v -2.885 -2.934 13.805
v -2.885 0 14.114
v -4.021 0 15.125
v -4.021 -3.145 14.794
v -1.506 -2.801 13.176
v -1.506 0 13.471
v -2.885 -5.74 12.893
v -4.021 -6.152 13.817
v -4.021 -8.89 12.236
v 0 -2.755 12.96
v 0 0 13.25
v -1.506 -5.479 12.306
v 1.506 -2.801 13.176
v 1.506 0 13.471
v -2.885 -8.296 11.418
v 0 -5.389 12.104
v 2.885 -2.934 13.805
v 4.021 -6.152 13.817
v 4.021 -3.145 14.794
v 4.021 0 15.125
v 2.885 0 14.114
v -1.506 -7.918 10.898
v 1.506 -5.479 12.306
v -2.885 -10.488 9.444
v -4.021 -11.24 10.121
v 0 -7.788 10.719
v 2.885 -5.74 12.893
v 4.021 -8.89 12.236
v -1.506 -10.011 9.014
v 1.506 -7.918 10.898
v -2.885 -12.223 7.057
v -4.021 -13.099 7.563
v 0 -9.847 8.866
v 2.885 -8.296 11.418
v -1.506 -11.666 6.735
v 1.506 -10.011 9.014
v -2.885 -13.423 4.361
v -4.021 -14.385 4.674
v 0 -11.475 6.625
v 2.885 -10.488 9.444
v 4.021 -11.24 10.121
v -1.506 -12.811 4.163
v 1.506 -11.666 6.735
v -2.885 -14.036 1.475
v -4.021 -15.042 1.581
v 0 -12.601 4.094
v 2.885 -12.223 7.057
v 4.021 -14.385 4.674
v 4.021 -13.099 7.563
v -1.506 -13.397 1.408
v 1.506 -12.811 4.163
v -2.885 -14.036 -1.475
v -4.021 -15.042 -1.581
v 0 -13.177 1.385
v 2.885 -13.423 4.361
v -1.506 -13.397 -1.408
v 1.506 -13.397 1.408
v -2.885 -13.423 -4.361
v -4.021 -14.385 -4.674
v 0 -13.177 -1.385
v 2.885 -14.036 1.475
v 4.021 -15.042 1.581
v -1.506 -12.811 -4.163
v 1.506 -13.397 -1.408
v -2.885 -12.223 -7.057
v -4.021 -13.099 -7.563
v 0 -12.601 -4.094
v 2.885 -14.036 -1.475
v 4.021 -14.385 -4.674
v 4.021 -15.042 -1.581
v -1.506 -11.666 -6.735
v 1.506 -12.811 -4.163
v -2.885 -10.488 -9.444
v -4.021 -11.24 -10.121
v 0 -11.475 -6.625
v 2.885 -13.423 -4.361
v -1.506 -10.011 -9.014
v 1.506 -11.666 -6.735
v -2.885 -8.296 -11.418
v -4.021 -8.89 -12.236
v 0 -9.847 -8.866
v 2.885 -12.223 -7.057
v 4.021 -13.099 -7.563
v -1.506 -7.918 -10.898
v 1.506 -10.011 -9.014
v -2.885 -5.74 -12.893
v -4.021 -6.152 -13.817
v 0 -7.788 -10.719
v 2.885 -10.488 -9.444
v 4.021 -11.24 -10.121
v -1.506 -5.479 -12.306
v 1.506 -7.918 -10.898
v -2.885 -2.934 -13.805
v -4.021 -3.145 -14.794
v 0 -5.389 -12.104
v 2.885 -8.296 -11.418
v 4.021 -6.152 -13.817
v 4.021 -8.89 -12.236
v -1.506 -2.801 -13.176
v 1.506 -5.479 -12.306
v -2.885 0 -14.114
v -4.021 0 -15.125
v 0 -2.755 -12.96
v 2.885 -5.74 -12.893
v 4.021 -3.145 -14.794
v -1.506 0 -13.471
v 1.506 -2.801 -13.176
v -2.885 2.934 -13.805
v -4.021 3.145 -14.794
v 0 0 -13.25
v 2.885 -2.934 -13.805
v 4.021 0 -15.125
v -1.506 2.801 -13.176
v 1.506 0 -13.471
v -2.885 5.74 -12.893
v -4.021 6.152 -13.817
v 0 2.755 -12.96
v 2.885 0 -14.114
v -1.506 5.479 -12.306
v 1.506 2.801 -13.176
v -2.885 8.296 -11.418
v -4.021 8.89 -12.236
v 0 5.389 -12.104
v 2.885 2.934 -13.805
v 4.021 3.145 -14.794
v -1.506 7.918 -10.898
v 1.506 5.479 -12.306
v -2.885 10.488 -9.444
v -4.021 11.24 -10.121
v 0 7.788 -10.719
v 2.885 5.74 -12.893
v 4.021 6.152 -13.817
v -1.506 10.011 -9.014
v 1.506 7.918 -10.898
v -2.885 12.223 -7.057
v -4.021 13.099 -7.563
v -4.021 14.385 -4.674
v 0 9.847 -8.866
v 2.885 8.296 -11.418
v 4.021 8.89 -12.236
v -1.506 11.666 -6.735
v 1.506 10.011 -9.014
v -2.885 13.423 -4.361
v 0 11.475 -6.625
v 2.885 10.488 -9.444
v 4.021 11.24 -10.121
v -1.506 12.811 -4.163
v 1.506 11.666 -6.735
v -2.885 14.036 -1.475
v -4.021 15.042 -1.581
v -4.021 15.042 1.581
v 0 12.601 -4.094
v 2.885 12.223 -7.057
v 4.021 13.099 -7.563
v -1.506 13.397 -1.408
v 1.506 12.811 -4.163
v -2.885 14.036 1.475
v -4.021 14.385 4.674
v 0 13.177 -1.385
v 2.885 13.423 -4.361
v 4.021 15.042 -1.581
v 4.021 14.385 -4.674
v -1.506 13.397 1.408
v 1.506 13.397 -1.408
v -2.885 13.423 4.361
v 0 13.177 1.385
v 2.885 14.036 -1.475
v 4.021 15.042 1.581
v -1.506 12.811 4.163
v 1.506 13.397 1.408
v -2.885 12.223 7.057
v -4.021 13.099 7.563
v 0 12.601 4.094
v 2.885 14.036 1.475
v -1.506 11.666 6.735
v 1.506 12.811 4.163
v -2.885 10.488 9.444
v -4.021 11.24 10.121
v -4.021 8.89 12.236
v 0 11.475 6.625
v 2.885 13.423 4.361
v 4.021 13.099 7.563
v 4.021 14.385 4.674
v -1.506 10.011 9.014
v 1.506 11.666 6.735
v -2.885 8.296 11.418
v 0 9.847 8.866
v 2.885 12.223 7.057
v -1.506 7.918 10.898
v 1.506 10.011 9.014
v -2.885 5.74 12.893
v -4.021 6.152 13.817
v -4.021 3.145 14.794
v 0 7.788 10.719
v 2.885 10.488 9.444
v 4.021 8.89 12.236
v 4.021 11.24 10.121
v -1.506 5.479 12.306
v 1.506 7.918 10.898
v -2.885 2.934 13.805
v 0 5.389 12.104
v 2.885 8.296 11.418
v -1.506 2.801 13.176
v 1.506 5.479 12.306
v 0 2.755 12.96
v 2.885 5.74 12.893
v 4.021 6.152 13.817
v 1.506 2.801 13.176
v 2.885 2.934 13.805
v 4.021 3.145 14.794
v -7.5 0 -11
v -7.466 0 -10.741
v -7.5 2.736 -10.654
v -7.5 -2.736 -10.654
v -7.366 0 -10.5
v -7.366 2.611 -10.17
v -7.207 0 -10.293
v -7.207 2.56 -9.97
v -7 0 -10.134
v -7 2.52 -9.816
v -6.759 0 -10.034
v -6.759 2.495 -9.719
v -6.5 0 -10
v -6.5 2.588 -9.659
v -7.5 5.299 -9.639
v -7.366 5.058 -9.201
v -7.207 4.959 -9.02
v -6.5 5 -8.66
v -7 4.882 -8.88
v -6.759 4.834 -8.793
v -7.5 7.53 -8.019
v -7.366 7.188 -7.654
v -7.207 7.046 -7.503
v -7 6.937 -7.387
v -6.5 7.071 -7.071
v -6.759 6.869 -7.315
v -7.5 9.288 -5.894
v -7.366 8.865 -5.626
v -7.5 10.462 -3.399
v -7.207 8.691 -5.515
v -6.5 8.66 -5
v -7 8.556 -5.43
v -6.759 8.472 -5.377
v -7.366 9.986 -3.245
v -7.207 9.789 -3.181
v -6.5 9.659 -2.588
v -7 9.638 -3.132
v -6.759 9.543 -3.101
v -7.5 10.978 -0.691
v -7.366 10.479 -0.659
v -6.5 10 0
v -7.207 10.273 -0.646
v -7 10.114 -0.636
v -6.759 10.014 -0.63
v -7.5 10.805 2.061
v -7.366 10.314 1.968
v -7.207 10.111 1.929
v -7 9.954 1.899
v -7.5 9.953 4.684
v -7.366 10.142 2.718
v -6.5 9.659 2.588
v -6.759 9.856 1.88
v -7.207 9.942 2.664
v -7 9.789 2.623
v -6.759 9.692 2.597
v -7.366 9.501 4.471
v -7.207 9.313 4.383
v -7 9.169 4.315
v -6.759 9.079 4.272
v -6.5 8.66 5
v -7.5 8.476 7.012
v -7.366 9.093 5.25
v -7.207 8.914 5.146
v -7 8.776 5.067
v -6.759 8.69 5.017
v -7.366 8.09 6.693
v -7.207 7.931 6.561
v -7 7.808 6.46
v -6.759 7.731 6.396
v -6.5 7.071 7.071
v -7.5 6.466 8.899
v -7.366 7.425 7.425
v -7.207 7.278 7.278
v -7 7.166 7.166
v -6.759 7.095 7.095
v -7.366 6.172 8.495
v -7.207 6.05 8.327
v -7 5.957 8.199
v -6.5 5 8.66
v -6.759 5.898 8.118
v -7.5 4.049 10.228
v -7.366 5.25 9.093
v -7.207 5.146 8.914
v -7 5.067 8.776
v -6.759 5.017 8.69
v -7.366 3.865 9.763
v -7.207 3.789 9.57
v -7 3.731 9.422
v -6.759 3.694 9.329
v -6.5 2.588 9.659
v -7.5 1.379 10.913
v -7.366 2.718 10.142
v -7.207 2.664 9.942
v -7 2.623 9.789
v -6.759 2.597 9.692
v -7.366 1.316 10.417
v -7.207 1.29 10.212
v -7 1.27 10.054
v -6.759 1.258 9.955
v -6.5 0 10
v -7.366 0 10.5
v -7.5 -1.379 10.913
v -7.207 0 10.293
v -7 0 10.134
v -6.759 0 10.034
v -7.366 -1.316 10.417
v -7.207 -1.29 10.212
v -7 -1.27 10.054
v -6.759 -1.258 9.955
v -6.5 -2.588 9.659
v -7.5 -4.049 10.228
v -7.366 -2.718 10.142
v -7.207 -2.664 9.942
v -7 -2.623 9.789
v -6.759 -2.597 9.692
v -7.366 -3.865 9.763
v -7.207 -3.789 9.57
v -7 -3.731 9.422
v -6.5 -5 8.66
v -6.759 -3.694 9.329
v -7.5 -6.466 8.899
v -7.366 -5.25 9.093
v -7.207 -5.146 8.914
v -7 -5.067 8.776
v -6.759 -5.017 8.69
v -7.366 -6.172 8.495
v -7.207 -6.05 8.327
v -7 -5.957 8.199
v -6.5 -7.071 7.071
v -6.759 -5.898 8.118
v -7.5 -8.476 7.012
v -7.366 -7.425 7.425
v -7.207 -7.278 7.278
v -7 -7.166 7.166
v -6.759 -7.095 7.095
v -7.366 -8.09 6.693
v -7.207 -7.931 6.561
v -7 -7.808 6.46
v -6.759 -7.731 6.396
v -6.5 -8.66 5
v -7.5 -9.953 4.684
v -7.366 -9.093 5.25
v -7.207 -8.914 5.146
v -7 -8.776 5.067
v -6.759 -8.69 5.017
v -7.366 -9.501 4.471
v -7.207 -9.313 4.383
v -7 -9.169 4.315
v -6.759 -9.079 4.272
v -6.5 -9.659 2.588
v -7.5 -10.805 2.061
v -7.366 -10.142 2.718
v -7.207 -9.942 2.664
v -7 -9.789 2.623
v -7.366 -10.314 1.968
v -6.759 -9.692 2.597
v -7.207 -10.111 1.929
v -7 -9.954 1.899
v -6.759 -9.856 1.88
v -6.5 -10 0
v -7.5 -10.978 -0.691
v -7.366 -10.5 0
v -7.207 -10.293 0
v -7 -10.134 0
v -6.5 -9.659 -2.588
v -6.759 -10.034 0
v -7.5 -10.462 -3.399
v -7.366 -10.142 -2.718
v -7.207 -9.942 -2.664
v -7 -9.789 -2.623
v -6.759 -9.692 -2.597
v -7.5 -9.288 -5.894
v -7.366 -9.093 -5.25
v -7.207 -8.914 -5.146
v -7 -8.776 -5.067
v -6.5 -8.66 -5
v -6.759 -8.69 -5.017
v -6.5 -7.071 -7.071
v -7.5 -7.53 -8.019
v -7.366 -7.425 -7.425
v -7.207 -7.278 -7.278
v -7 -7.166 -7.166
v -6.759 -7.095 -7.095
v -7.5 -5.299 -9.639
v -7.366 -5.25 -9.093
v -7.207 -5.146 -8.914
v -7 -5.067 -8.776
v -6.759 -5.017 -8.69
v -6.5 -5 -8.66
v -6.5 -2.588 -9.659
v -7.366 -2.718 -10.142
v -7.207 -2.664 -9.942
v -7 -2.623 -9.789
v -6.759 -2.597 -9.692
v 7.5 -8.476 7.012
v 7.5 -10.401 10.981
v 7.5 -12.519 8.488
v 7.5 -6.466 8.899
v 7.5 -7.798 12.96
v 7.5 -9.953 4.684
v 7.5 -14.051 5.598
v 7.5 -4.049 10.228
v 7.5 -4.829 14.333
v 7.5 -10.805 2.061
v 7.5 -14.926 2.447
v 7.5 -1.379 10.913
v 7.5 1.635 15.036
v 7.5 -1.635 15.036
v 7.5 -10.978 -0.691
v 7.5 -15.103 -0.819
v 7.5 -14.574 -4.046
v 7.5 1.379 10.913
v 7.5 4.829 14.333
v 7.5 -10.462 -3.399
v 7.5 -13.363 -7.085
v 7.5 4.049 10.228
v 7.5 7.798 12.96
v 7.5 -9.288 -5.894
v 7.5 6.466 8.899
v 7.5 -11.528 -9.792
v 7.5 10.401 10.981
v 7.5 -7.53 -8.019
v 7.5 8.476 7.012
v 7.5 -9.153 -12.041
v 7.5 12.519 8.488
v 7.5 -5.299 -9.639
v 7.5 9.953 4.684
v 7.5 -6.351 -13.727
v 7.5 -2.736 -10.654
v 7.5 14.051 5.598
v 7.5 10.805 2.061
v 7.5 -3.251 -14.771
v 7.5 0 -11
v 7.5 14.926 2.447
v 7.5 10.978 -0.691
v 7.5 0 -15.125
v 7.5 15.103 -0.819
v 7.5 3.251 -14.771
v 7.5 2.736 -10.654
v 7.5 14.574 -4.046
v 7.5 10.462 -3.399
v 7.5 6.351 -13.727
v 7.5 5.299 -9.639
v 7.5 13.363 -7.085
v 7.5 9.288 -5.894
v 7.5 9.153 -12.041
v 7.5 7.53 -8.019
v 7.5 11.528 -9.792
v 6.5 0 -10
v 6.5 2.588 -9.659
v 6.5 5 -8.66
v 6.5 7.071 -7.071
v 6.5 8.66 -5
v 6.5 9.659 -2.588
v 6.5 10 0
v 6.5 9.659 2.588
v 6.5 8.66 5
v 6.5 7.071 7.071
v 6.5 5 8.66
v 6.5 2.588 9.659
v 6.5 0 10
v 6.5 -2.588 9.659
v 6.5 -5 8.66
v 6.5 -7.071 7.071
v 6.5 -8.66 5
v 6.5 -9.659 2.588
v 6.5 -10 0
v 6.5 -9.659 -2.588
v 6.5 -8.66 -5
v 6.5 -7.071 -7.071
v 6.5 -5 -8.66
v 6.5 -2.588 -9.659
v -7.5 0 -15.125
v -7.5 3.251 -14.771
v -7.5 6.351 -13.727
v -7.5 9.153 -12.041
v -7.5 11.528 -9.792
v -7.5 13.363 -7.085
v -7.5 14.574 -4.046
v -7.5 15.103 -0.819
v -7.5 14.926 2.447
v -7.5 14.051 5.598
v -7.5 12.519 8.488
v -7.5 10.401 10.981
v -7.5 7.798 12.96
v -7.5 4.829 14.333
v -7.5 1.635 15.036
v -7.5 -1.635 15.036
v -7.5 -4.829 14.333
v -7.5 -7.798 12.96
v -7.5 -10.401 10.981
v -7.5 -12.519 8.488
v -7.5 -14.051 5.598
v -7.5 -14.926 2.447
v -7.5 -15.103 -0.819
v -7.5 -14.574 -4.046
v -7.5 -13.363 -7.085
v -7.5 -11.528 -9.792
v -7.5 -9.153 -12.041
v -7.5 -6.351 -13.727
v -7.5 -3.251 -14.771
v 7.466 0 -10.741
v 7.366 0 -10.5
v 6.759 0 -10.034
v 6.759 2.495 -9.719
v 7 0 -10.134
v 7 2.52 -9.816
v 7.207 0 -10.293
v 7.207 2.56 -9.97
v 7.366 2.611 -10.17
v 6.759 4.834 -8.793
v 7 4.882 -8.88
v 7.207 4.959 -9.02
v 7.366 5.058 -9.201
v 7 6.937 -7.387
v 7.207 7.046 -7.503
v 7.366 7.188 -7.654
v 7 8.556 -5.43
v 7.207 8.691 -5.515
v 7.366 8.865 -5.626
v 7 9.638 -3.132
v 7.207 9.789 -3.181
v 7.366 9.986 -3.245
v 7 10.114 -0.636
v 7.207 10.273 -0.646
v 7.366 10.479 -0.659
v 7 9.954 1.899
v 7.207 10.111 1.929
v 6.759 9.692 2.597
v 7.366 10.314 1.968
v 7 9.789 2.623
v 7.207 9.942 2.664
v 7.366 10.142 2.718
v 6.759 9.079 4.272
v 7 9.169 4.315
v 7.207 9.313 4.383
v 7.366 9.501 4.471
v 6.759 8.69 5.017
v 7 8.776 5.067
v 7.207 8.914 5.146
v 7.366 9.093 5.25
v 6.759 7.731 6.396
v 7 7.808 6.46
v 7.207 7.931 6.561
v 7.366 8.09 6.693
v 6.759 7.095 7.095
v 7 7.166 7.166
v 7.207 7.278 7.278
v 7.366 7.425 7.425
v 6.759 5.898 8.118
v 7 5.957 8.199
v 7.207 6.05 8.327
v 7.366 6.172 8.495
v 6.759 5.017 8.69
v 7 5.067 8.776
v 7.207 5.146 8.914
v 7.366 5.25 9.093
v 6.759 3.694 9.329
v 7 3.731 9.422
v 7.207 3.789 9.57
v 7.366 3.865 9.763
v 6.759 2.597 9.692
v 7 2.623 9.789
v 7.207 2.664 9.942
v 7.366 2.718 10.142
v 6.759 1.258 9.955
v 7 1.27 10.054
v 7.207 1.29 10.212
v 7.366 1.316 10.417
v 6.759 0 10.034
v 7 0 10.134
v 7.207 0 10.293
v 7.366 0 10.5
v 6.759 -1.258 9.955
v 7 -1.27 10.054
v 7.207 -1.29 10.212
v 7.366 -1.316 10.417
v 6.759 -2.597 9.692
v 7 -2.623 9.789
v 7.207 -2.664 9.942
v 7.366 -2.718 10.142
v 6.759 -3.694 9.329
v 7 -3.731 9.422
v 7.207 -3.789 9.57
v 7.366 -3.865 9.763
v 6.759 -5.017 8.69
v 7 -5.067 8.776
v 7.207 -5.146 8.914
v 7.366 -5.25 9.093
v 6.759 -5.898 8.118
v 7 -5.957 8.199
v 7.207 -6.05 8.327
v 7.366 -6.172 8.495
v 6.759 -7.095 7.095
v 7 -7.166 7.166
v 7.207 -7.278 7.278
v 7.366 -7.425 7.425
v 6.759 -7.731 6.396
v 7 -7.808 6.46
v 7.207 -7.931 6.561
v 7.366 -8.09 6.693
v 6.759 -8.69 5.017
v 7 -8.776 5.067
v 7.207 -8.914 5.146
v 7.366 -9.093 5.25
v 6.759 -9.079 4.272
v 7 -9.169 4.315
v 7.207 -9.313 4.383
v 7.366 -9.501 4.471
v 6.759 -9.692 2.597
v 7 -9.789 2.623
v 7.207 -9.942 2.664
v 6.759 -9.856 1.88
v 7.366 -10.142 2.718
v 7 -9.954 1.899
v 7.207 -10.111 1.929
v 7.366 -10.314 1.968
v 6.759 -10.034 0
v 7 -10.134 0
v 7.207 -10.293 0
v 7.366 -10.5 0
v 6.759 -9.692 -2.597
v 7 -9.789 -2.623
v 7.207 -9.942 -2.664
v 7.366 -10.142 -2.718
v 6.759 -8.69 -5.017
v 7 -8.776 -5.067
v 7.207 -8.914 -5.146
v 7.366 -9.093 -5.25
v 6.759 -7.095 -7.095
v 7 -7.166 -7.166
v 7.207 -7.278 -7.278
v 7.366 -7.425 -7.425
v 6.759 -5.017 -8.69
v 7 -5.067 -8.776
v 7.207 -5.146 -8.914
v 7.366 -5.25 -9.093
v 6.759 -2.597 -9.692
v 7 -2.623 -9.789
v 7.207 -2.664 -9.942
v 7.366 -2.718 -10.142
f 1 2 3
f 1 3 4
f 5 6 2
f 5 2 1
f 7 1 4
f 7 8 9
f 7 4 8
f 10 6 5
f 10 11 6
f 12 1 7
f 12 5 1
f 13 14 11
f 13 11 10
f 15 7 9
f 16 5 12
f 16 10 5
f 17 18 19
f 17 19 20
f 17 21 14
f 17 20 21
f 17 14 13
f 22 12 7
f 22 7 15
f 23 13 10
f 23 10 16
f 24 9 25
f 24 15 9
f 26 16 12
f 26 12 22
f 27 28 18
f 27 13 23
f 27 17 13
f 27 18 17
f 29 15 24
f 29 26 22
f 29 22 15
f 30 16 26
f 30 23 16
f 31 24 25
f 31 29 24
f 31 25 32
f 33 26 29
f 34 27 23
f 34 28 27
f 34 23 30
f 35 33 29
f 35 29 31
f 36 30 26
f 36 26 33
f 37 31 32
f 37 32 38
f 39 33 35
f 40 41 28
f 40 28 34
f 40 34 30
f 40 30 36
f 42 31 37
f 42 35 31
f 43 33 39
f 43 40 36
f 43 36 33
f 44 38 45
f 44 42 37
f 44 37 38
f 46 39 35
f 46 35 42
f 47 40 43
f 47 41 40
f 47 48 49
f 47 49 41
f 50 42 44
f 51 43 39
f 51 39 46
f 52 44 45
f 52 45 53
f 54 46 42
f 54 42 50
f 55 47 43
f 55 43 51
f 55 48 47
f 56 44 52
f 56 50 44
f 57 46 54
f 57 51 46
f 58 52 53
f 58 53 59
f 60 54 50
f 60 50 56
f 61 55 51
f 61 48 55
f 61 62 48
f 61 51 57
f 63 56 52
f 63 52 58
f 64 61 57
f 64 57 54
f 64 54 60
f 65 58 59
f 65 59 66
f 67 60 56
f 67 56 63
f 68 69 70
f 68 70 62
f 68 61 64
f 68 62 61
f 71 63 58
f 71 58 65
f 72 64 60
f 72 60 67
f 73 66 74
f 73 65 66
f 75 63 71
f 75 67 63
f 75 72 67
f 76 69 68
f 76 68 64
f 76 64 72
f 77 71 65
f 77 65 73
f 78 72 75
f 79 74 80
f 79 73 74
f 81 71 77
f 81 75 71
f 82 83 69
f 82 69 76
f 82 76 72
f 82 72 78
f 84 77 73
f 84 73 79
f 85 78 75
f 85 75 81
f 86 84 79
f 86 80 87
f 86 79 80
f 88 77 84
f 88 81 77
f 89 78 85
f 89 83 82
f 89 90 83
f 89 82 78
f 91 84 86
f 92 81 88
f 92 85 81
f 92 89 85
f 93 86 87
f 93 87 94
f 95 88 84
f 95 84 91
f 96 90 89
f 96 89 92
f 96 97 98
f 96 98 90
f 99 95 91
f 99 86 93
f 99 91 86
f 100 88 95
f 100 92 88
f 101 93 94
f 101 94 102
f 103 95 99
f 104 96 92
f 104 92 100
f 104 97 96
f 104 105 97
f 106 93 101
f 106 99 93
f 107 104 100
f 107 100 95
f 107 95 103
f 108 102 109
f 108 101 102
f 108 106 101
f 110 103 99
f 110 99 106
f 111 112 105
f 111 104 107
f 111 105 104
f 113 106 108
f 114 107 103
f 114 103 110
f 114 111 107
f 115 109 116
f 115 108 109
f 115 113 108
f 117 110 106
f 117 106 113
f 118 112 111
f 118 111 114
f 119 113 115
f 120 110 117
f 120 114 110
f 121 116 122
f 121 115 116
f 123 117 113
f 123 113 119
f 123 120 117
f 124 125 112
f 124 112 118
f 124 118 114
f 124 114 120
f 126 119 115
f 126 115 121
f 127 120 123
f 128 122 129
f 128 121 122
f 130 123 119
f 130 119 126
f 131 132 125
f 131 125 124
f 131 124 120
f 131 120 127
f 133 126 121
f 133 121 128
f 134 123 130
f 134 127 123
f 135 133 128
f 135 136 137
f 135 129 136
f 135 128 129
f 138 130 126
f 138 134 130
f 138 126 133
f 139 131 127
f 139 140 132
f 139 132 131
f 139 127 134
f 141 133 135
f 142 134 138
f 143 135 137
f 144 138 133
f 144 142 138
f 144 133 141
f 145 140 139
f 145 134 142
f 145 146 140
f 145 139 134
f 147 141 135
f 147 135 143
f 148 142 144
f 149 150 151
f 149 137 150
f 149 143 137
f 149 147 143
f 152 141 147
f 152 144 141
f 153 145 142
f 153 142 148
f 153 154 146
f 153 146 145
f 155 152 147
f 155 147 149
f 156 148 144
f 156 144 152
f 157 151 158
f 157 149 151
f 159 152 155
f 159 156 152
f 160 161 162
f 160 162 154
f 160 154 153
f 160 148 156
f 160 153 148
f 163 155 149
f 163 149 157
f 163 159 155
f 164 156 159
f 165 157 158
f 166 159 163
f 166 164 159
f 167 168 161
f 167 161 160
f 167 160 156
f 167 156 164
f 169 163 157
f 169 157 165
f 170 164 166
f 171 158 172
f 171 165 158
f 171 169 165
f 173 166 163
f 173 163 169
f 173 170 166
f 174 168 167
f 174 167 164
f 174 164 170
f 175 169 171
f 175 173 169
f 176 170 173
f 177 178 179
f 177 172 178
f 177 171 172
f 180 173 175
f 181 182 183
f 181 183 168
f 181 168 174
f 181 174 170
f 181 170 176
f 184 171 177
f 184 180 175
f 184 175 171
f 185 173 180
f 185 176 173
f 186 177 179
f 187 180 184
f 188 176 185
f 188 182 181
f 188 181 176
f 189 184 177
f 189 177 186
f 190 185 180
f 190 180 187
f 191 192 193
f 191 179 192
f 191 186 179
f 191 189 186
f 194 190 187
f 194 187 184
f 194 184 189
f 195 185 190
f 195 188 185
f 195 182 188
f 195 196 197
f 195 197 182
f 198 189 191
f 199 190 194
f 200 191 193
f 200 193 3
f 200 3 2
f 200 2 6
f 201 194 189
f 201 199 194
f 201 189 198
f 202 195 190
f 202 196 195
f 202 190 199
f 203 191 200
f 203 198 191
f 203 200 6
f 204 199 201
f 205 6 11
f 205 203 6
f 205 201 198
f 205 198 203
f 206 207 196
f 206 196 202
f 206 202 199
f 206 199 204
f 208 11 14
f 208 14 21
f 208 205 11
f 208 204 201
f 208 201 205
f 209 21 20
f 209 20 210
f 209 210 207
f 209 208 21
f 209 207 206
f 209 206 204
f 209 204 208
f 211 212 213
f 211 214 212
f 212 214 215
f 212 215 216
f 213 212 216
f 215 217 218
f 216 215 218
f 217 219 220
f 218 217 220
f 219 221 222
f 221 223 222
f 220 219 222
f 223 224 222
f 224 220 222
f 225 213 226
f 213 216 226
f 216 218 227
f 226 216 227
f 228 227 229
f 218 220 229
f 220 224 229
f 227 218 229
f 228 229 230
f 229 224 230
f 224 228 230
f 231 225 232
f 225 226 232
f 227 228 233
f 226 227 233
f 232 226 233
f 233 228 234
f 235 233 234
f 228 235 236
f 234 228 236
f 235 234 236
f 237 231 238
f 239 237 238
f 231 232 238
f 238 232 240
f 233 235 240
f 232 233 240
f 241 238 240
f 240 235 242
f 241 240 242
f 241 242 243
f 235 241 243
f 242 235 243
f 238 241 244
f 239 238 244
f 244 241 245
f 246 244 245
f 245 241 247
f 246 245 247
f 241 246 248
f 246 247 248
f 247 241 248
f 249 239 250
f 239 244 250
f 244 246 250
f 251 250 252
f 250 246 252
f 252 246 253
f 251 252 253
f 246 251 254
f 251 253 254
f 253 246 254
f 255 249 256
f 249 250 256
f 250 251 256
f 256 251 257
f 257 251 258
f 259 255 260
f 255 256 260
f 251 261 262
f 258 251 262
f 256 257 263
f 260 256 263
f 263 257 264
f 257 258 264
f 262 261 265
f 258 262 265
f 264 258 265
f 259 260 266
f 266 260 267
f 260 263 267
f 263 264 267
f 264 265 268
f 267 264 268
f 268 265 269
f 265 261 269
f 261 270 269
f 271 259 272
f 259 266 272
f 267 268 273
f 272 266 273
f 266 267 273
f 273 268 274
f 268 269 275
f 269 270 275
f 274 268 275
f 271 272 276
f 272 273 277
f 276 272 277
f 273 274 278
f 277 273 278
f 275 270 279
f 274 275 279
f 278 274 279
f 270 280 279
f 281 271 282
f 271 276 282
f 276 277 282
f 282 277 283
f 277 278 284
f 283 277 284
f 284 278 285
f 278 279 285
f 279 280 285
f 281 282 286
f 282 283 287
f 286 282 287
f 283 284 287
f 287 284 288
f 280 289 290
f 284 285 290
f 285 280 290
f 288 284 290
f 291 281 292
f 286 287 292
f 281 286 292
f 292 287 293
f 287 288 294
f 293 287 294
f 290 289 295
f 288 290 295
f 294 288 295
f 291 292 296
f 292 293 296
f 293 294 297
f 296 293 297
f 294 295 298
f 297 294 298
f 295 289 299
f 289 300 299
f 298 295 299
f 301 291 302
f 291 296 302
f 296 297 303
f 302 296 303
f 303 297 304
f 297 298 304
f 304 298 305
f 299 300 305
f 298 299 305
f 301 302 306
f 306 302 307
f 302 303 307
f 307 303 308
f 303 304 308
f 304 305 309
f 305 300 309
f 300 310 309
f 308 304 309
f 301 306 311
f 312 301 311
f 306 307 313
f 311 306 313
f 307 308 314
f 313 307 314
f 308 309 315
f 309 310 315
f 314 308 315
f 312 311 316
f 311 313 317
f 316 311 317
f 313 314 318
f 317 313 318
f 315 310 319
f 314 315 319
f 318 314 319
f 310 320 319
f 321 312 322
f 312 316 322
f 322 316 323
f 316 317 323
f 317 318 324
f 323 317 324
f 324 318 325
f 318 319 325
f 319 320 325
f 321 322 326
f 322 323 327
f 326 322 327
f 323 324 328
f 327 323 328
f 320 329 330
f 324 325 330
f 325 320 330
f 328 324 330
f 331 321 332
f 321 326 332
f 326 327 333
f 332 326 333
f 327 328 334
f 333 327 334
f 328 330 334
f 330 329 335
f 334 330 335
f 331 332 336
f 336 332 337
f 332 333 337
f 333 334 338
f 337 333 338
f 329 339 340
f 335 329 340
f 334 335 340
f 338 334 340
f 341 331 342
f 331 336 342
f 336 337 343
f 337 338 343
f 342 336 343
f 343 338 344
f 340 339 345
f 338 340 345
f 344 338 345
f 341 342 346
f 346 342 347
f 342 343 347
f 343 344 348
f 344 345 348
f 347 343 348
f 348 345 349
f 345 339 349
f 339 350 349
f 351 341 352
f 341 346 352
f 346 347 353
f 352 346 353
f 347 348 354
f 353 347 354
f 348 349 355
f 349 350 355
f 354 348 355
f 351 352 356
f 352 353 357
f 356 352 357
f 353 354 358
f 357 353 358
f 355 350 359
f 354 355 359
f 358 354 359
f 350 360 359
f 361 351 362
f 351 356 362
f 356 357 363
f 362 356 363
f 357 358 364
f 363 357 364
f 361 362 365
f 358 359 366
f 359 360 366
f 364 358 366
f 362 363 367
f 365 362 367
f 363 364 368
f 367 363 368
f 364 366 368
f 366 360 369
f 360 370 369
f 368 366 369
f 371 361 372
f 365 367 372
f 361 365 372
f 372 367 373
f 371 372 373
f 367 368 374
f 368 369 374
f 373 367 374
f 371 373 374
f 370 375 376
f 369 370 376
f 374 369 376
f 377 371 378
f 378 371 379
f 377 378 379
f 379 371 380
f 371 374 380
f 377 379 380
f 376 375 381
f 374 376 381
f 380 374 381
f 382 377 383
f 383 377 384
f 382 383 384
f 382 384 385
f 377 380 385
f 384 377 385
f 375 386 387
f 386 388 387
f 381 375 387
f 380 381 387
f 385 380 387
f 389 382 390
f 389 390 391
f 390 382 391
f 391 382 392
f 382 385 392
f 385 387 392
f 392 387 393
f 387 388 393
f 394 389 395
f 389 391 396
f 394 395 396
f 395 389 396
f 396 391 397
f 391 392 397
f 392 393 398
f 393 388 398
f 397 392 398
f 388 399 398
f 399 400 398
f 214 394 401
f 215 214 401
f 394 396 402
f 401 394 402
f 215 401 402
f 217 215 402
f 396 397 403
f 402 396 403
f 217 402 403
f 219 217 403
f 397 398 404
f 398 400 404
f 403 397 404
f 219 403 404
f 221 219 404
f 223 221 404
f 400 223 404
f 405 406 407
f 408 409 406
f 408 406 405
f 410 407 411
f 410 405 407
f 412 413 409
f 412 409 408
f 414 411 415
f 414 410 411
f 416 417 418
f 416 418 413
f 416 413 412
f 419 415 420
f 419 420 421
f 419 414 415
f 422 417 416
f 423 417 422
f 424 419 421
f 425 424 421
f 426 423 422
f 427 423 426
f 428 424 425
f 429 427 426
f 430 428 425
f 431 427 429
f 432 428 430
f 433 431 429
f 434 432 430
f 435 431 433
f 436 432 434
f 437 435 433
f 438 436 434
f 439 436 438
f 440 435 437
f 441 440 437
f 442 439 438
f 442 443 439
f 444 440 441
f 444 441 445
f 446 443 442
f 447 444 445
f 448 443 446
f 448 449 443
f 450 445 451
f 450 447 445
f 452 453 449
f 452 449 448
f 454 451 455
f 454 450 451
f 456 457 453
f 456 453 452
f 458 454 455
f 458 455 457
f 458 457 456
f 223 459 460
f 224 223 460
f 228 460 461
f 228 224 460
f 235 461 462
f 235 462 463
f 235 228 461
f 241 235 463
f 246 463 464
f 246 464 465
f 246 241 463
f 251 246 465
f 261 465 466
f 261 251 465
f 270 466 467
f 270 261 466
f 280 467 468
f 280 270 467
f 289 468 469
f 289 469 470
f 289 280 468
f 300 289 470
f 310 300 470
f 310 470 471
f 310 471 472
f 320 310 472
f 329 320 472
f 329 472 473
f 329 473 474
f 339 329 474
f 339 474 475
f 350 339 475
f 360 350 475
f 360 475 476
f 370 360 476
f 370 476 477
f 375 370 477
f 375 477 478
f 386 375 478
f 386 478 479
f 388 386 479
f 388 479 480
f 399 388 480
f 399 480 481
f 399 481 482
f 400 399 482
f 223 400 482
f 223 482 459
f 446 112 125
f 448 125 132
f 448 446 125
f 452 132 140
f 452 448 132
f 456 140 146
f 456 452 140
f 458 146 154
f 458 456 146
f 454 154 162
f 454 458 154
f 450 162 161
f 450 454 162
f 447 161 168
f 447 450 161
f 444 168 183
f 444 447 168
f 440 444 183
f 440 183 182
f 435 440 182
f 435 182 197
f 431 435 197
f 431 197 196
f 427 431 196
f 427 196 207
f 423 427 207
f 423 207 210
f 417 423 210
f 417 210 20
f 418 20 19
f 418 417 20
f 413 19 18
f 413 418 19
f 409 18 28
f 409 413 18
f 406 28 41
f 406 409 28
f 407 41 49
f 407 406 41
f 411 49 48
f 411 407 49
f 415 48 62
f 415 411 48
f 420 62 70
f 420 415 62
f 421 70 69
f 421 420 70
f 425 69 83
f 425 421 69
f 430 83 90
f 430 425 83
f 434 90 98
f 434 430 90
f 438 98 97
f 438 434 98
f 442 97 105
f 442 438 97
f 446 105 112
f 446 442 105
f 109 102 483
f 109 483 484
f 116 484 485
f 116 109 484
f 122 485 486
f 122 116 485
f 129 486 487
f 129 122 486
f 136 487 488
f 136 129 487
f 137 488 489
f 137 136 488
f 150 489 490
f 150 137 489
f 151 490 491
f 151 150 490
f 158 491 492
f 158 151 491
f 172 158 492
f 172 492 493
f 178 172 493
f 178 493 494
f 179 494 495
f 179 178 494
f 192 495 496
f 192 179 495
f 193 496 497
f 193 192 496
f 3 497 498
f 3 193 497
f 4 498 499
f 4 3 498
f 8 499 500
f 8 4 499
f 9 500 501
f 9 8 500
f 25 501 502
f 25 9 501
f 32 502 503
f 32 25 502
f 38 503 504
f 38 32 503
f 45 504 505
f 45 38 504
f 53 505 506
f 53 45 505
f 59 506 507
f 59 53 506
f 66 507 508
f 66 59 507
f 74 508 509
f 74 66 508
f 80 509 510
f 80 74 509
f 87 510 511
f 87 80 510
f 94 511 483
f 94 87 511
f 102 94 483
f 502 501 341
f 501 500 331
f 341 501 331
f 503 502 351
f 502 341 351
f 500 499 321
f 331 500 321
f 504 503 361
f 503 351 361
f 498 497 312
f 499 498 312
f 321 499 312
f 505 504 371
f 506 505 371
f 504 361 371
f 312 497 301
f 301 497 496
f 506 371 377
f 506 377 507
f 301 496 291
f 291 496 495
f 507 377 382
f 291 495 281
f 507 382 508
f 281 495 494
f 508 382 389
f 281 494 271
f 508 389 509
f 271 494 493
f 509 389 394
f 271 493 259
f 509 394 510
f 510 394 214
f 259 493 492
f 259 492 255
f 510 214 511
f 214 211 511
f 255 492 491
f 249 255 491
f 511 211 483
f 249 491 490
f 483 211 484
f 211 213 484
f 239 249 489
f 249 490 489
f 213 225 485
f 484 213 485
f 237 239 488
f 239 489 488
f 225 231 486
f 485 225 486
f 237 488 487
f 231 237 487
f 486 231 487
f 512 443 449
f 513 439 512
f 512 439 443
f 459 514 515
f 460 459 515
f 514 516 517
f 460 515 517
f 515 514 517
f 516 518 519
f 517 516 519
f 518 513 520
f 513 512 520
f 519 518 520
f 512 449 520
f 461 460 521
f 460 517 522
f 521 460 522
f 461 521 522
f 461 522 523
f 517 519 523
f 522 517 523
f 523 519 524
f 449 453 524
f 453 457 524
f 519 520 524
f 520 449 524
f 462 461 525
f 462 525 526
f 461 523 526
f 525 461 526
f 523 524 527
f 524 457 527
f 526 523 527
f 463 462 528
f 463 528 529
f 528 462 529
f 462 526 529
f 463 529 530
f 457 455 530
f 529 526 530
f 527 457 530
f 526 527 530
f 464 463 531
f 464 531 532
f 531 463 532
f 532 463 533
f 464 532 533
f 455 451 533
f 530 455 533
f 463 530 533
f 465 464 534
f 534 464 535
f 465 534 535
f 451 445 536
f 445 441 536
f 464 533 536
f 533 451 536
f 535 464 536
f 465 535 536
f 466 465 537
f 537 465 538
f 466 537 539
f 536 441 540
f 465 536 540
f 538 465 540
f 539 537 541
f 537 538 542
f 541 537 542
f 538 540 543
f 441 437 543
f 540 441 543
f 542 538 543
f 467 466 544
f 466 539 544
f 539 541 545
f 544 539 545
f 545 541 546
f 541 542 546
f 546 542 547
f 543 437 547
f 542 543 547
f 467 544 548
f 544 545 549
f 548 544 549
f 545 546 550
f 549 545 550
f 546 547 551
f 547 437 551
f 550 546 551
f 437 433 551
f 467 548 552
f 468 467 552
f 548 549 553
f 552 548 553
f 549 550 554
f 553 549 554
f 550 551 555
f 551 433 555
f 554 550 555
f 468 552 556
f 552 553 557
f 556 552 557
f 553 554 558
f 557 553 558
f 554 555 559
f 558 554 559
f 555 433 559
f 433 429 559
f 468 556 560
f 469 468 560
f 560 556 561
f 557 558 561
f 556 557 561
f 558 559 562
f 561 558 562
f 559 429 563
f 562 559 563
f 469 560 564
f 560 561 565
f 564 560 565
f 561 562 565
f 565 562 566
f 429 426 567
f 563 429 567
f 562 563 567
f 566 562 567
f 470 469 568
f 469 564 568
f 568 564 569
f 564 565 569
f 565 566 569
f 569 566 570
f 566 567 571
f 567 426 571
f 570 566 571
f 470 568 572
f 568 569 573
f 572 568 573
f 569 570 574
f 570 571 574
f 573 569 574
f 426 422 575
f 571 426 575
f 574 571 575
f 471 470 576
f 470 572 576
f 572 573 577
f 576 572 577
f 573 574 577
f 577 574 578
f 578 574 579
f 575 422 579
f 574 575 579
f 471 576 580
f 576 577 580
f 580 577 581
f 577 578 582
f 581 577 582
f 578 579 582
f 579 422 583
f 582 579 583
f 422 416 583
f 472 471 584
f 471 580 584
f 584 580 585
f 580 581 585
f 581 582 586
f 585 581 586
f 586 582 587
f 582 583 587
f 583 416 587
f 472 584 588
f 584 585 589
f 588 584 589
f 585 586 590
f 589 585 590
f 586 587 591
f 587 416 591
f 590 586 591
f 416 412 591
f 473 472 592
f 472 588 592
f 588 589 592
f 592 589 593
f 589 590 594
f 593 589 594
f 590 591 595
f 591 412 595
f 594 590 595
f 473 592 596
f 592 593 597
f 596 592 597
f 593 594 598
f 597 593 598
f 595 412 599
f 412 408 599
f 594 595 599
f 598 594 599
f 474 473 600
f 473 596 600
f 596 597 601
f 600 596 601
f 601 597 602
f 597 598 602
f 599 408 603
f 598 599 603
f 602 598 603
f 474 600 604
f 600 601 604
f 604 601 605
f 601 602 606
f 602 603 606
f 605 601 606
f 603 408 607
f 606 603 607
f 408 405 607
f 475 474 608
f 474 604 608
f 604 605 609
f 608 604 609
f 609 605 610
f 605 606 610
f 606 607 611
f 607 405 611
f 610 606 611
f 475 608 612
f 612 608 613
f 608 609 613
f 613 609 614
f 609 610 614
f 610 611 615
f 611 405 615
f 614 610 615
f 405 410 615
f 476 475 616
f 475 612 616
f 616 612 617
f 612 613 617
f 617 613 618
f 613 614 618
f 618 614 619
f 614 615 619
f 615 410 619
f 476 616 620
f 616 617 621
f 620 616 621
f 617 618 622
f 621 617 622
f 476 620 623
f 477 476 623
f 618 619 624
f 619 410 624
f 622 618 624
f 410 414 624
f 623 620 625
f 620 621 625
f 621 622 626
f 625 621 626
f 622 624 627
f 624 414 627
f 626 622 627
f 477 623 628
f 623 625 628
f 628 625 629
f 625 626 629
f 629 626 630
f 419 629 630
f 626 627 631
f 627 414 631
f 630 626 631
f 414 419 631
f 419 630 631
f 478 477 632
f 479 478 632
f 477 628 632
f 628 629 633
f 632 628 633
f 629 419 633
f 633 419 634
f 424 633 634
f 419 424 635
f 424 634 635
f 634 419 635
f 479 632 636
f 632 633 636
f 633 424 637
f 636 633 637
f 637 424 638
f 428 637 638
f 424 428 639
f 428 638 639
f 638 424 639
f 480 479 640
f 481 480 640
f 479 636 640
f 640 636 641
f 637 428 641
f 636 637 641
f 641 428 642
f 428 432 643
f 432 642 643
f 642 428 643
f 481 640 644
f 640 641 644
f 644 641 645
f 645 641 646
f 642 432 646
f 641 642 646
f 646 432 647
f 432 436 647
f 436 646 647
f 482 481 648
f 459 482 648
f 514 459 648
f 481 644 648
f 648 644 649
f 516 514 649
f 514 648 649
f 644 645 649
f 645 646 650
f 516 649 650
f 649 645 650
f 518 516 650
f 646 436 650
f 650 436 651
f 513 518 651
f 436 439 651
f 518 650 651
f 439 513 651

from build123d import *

# Parameters (mm, degrees)
SKETCH1_R           = 15.125
SKETCH1_R_2         = 10
BOSS_EXTRUDE1_DEPTH = 7.5
SKETCH2_R           = 5.25
FILLET1_R           = 1


with BuildPart() as part:
    # Sketch1 → Boss-Extrude1 (new, symmetric)
    with BuildSketch(Plane(origin=(0, 0, 0), x_dir=(0, 0, -1), z_dir=(1, 0, 0))):
        Circle(SKETCH1_R)
        Circle(SKETCH1_R_2, mode=Mode.SUBTRACT)
    extrude(amount=BOSS_EXTRUDE1_DEPTH, both=True)

    # Sketch2 → Cut-Revolve1 (revolve, cut)
    with BuildSketch(Plane.XY, mode=Mode.PRIVATE) as cut_revolve1_sk:
        with Locations((0, 18.5)):
            Circle(SKETCH2_R)
    revolve(cut_revolve1_sk.sketch.rotate(Axis((0, 0, 0), (1, 0, 0)), 90), axis=Axis((0, 0, 0), (1, 0, 0)), mode=Mode.SUBTRACT)

    # Fillet1
    fillet1_edges = [part.edges().sort_by_distance(p)[0] for p in [
        (-7.5, 0, 10),
        (7.5, 0, 10),
    ]]
    fillet(fillet1_edges, radius=FILLET1_R)


solid = part.part
